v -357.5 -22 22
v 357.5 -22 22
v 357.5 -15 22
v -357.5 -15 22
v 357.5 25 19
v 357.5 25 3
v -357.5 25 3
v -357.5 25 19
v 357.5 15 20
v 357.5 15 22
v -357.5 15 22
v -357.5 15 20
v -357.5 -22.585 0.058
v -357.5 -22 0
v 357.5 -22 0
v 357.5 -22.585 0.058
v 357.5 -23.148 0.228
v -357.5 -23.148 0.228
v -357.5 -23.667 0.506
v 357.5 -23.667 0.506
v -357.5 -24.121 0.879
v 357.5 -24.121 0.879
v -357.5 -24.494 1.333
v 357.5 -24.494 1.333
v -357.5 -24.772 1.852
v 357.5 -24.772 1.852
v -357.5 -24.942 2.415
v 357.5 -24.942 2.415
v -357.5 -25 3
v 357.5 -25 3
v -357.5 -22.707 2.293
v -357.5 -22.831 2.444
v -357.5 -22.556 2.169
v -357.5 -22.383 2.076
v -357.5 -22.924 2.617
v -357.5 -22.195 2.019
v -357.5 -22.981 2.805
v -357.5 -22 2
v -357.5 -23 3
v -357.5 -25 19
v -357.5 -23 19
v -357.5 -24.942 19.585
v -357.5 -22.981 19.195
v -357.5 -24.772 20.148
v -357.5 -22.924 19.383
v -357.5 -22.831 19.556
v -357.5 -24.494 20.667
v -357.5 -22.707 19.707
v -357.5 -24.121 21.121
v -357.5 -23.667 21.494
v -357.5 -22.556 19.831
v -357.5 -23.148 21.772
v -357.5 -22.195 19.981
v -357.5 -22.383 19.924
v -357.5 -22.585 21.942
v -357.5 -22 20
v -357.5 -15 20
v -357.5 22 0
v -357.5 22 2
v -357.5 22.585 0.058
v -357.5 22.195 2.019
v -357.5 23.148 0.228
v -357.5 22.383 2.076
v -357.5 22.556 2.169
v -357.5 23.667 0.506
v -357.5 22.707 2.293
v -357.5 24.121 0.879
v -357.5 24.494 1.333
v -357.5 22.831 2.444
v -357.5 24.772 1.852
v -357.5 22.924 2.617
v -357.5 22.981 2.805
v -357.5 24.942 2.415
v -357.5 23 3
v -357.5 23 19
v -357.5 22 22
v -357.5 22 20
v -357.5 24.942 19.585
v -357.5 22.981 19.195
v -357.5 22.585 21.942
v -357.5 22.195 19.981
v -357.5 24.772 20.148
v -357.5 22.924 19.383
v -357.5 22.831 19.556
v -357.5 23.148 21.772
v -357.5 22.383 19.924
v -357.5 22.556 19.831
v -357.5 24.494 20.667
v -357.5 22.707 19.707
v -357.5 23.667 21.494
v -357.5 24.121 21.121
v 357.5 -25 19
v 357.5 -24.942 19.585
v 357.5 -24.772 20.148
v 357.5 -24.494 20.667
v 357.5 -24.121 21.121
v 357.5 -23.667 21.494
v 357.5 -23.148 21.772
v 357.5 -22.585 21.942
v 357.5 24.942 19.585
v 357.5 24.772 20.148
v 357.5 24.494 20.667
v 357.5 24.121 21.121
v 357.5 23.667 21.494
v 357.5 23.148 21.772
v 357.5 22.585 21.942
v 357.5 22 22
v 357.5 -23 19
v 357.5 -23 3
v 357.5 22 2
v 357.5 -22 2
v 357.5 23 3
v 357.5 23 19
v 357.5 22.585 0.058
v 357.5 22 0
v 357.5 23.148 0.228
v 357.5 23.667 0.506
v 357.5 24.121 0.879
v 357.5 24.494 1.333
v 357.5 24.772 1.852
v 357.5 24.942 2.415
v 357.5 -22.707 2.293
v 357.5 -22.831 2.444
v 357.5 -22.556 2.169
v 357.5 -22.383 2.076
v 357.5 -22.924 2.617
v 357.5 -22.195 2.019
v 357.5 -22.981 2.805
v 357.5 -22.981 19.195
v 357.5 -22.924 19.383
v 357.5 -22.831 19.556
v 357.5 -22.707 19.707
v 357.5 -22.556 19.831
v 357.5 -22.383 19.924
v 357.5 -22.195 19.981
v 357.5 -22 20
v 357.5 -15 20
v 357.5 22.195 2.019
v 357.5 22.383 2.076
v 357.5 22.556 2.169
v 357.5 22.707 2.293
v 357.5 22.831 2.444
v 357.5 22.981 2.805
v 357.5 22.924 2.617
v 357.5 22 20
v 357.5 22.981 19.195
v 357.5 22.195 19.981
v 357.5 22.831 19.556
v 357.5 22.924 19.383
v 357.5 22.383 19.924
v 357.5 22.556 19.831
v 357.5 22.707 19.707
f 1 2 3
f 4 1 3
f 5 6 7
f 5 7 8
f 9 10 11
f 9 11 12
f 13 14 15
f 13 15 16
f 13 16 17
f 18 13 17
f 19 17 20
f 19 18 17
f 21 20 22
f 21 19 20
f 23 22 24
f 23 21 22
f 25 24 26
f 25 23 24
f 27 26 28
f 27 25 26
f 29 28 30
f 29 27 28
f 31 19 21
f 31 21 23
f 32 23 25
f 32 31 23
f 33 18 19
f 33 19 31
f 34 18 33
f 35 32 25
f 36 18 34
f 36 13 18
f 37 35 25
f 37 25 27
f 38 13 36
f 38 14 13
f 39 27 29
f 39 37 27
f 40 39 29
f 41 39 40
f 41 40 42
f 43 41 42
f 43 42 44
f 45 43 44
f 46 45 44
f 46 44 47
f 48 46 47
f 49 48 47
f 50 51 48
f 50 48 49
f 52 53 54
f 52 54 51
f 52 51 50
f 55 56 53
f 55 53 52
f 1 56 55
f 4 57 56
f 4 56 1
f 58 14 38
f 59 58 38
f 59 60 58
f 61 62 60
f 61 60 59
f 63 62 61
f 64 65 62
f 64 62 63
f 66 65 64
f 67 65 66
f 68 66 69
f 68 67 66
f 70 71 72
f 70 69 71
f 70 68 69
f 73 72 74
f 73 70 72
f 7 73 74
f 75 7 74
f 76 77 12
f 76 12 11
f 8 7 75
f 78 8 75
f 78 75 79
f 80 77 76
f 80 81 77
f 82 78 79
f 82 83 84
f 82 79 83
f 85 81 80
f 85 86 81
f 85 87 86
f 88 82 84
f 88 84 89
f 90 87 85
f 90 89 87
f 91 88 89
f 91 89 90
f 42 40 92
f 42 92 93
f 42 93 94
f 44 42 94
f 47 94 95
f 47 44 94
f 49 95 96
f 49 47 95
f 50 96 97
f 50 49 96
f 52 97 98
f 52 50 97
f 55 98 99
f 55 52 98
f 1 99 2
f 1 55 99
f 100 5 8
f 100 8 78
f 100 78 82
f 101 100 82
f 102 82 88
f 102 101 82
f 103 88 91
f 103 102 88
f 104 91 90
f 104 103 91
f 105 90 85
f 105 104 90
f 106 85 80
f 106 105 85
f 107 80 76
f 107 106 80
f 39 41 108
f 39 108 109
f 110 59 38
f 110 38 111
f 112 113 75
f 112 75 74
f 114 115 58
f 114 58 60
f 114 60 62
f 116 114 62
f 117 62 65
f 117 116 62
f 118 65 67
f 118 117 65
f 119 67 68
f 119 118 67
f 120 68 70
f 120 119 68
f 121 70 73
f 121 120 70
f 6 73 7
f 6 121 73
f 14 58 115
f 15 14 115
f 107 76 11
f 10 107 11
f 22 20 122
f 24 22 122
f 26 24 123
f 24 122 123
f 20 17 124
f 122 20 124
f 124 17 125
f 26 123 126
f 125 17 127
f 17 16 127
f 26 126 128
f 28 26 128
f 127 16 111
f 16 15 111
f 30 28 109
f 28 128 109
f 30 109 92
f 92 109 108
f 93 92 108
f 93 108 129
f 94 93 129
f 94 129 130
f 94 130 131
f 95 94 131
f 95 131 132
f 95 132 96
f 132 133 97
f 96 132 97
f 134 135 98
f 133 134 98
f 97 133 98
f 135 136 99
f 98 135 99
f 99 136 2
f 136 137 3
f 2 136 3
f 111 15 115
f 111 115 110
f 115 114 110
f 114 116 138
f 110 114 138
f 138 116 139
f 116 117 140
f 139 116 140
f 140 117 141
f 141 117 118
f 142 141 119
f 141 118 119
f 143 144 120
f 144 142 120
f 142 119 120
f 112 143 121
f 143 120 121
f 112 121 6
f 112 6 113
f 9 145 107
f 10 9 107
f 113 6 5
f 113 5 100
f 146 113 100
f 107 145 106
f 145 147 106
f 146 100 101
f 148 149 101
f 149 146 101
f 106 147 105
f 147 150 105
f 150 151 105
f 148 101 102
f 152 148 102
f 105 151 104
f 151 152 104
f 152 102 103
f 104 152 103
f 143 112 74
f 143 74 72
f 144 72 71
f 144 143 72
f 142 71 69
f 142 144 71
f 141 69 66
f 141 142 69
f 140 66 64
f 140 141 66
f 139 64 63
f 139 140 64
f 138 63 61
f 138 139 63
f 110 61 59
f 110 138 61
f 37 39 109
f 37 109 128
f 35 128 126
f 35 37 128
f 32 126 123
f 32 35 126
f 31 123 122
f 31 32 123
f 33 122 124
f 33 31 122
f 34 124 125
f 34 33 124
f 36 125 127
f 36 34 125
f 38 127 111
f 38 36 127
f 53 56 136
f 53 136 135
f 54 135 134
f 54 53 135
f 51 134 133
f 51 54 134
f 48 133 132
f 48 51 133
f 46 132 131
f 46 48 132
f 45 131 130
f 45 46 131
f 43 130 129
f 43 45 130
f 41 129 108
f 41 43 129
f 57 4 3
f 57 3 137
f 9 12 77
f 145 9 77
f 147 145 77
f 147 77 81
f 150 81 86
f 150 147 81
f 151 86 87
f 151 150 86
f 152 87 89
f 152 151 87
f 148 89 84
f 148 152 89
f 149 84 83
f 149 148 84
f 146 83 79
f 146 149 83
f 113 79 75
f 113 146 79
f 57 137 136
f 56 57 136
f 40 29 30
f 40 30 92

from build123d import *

# Parameters (mm, degrees)
BASEFLANGE_W                   = 715
BASEFLANGE_H                   = 50
BASE_FLANGE1_DEPTH             = 2
EDGE_FLANGE1_STRIP_W           = 10
EDGE_FLANGE1_STRIP_H           = 2
EDGE_FLANGE1_STRIP_CUT_DEPTH   = 715
EDGE_FLANGE1_STRIP_2_W         = 10
EDGE_FLANGE1_STRIP_2_H         = 2
EDGE_FLANGE1_STRIP_CUT_2_DEPTH = 715
EDGE_FLANGE1_DEPTH             = 715
EDGE_FLANGE1_BEND_DEPTH        = 715
EDGE_FLANGE2_STRIP_W           = 10
EDGE_FLANGE2_STRIP_H           = 2
EDGE_FLANGE2_STRIP_CUT_DEPTH   = 715
EDGE_FLANGE2_STRIP_2_W         = 10
EDGE_FLANGE2_STRIP_2_H         = 2
EDGE_FLANGE2_STRIP_CUT_2_DEPTH = 715
EDGE_FLANGE2_DEPTH             = 715
EDGE_FLANGE2_BEND_DEPTH        = 715


# Sheet-metal steps are written as plain solids
with BuildPart() as part:
    # BaseFlange → Base-Flange1 (new body)
    with BuildSketch(Plane.XY):
        Rectangle(BASEFLANGE_W, BASEFLANGE_H)
    extrude(amount=BASE_FLANGE1_DEPTH)

    # Edge-Flange1 strip (across the edge) → Edge-Flange1 strip cut (cut)
    with BuildSketch(Plane(origin=(357.5, 25, 2), x_dir=(0, -1, 0), z_dir=(-1, 0, 0))):
        with Locations((-2, -1)):
            Rectangle(EDGE_FLANGE1_STRIP_W, EDGE_FLANGE1_STRIP_H)
    extrude(amount=EDGE_FLANGE1_STRIP_CUT_DEPTH, mode=Mode.SUBTRACT)

    # Edge-Flange1 strip 2 (across the edge) → Edge-Flange1 strip cut 2 (cut)
    with BuildSketch(Plane(origin=(-357.5, -25, 2), x_dir=(0, 1, 0), z_dir=(1, 0, 0))):
        with Locations((-2, -1)):
            Rectangle(EDGE_FLANGE1_STRIP_2_W, EDGE_FLANGE1_STRIP_2_H)
    extrude(amount=EDGE_FLANGE1_STRIP_CUT_2_DEPTH, mode=Mode.SUBTRACT)

    # Edge-Flange1 section (across the edge) → Edge-Flange1 (add)
    with BuildSketch(Plane(origin=(357.5, 25, 2), x_dir=(0, -1, 0), z_dir=(-1, 0, 0))):
        with BuildLine():
            Line((0, 1), (0, 20))
            Line((0, 20), (2, 20))
            Line((2, 20), (2, 1))
            ThreePointArc((2, 1), (2.292893219, 0.292893219), (3, 0))
            Line((3, 0), (3, -2))
            ThreePointArc((3, -2), (0.878679656, -1.121320344), (0, 1))
        make_face()
    extrude(amount=EDGE_FLANGE1_DEPTH)

    # Edge-Flange1 section 2 (across the edge) → Edge-Flange1 bend (add)
    with BuildSketch(Plane(origin=(-357.5, -25, 2), x_dir=(0, 1, 0), z_dir=(1, 0, 0))):
        with BuildLine():
            Line((0, 1), (0, 20))
            Line((0, 20), (2, 20))
            Line((2, 20), (2, 1))
            ThreePointArc((2, 1), (2.292893219, 0.292893219), (3, 0))
            Line((3, 0), (3, -2))
            ThreePointArc((3, -2), (0.878679656, -1.121320344), (0, 1))
        make_face()
    extrude(amount=EDGE_FLANGE1_BEND_DEPTH)

    # Edge-Flange2 strip (across the edge) → Edge-Flange2 strip cut (cut)
    with BuildSketch(Plane(origin=(357.5, 23, 22), x_dir=(0, 0, -1), z_dir=(-1, 0, 0))):
        with Locations((-2, -1)):
            Rectangle(EDGE_FLANGE2_STRIP_W, EDGE_FLANGE2_STRIP_H)
    extrude(amount=EDGE_FLANGE2_STRIP_CUT_DEPTH, mode=Mode.SUBTRACT)

    # Edge-Flange2 strip 2 (across the edge) → Edge-Flange2 strip cut 2 (cut)
    with BuildSketch(Plane(origin=(-357.5, -23, 22), x_dir=(0, 0, -1), z_dir=(1, 0, 0))):
        with Locations((-2, -1)):
            Rectangle(EDGE_FLANGE2_STRIP_2_W, EDGE_FLANGE2_STRIP_2_H)
    extrude(amount=EDGE_FLANGE2_STRIP_CUT_2_DEPTH, mode=Mode.SUBTRACT)

    # Edge-Flange2 section (across the edge) → Edge-Flange2 (add)
    with BuildSketch(Plane(origin=(357.5, 23, 22), x_dir=(0, 0, -1), z_dir=(-1, 0, 0))):
        with BuildLine():
            Line((0, 1), (0, 8))
            Line((0, 8), (2, 8))
            Line((2, 8), (2, 1))
            ThreePointArc((2, 1), (2.292893219, 0.292893219), (3, 0))
            Line((3, 0), (3, -2))
            ThreePointArc((3, -2), (0.878679656, -1.121320344), (0, 1))
        make_face()
    extrude(amount=EDGE_FLANGE2_DEPTH)

    # Edge-Flange2 section 2 (across the edge) → Edge-Flange2 bend (add)
    with BuildSketch(Plane(origin=(-357.5, -23, 22), x_dir=(0, 0, -1), z_dir=(1, 0, 0))):
        with BuildLine():
            Line((0, 1), (0, 8))
            Line((0, 8), (2, 8))
            Line((2, 8), (2, 1))
            ThreePointArc((2, 1), (2.292893219, 0.292893219), (3, 0))
            Line((3, 0), (3, -2))
            ThreePointArc((3, -2), (0.878679656, -1.121320344), (0, 1))
        make_face()
    extrude(amount=EDGE_FLANGE2_BEND_DEPTH)


solid = part.part
